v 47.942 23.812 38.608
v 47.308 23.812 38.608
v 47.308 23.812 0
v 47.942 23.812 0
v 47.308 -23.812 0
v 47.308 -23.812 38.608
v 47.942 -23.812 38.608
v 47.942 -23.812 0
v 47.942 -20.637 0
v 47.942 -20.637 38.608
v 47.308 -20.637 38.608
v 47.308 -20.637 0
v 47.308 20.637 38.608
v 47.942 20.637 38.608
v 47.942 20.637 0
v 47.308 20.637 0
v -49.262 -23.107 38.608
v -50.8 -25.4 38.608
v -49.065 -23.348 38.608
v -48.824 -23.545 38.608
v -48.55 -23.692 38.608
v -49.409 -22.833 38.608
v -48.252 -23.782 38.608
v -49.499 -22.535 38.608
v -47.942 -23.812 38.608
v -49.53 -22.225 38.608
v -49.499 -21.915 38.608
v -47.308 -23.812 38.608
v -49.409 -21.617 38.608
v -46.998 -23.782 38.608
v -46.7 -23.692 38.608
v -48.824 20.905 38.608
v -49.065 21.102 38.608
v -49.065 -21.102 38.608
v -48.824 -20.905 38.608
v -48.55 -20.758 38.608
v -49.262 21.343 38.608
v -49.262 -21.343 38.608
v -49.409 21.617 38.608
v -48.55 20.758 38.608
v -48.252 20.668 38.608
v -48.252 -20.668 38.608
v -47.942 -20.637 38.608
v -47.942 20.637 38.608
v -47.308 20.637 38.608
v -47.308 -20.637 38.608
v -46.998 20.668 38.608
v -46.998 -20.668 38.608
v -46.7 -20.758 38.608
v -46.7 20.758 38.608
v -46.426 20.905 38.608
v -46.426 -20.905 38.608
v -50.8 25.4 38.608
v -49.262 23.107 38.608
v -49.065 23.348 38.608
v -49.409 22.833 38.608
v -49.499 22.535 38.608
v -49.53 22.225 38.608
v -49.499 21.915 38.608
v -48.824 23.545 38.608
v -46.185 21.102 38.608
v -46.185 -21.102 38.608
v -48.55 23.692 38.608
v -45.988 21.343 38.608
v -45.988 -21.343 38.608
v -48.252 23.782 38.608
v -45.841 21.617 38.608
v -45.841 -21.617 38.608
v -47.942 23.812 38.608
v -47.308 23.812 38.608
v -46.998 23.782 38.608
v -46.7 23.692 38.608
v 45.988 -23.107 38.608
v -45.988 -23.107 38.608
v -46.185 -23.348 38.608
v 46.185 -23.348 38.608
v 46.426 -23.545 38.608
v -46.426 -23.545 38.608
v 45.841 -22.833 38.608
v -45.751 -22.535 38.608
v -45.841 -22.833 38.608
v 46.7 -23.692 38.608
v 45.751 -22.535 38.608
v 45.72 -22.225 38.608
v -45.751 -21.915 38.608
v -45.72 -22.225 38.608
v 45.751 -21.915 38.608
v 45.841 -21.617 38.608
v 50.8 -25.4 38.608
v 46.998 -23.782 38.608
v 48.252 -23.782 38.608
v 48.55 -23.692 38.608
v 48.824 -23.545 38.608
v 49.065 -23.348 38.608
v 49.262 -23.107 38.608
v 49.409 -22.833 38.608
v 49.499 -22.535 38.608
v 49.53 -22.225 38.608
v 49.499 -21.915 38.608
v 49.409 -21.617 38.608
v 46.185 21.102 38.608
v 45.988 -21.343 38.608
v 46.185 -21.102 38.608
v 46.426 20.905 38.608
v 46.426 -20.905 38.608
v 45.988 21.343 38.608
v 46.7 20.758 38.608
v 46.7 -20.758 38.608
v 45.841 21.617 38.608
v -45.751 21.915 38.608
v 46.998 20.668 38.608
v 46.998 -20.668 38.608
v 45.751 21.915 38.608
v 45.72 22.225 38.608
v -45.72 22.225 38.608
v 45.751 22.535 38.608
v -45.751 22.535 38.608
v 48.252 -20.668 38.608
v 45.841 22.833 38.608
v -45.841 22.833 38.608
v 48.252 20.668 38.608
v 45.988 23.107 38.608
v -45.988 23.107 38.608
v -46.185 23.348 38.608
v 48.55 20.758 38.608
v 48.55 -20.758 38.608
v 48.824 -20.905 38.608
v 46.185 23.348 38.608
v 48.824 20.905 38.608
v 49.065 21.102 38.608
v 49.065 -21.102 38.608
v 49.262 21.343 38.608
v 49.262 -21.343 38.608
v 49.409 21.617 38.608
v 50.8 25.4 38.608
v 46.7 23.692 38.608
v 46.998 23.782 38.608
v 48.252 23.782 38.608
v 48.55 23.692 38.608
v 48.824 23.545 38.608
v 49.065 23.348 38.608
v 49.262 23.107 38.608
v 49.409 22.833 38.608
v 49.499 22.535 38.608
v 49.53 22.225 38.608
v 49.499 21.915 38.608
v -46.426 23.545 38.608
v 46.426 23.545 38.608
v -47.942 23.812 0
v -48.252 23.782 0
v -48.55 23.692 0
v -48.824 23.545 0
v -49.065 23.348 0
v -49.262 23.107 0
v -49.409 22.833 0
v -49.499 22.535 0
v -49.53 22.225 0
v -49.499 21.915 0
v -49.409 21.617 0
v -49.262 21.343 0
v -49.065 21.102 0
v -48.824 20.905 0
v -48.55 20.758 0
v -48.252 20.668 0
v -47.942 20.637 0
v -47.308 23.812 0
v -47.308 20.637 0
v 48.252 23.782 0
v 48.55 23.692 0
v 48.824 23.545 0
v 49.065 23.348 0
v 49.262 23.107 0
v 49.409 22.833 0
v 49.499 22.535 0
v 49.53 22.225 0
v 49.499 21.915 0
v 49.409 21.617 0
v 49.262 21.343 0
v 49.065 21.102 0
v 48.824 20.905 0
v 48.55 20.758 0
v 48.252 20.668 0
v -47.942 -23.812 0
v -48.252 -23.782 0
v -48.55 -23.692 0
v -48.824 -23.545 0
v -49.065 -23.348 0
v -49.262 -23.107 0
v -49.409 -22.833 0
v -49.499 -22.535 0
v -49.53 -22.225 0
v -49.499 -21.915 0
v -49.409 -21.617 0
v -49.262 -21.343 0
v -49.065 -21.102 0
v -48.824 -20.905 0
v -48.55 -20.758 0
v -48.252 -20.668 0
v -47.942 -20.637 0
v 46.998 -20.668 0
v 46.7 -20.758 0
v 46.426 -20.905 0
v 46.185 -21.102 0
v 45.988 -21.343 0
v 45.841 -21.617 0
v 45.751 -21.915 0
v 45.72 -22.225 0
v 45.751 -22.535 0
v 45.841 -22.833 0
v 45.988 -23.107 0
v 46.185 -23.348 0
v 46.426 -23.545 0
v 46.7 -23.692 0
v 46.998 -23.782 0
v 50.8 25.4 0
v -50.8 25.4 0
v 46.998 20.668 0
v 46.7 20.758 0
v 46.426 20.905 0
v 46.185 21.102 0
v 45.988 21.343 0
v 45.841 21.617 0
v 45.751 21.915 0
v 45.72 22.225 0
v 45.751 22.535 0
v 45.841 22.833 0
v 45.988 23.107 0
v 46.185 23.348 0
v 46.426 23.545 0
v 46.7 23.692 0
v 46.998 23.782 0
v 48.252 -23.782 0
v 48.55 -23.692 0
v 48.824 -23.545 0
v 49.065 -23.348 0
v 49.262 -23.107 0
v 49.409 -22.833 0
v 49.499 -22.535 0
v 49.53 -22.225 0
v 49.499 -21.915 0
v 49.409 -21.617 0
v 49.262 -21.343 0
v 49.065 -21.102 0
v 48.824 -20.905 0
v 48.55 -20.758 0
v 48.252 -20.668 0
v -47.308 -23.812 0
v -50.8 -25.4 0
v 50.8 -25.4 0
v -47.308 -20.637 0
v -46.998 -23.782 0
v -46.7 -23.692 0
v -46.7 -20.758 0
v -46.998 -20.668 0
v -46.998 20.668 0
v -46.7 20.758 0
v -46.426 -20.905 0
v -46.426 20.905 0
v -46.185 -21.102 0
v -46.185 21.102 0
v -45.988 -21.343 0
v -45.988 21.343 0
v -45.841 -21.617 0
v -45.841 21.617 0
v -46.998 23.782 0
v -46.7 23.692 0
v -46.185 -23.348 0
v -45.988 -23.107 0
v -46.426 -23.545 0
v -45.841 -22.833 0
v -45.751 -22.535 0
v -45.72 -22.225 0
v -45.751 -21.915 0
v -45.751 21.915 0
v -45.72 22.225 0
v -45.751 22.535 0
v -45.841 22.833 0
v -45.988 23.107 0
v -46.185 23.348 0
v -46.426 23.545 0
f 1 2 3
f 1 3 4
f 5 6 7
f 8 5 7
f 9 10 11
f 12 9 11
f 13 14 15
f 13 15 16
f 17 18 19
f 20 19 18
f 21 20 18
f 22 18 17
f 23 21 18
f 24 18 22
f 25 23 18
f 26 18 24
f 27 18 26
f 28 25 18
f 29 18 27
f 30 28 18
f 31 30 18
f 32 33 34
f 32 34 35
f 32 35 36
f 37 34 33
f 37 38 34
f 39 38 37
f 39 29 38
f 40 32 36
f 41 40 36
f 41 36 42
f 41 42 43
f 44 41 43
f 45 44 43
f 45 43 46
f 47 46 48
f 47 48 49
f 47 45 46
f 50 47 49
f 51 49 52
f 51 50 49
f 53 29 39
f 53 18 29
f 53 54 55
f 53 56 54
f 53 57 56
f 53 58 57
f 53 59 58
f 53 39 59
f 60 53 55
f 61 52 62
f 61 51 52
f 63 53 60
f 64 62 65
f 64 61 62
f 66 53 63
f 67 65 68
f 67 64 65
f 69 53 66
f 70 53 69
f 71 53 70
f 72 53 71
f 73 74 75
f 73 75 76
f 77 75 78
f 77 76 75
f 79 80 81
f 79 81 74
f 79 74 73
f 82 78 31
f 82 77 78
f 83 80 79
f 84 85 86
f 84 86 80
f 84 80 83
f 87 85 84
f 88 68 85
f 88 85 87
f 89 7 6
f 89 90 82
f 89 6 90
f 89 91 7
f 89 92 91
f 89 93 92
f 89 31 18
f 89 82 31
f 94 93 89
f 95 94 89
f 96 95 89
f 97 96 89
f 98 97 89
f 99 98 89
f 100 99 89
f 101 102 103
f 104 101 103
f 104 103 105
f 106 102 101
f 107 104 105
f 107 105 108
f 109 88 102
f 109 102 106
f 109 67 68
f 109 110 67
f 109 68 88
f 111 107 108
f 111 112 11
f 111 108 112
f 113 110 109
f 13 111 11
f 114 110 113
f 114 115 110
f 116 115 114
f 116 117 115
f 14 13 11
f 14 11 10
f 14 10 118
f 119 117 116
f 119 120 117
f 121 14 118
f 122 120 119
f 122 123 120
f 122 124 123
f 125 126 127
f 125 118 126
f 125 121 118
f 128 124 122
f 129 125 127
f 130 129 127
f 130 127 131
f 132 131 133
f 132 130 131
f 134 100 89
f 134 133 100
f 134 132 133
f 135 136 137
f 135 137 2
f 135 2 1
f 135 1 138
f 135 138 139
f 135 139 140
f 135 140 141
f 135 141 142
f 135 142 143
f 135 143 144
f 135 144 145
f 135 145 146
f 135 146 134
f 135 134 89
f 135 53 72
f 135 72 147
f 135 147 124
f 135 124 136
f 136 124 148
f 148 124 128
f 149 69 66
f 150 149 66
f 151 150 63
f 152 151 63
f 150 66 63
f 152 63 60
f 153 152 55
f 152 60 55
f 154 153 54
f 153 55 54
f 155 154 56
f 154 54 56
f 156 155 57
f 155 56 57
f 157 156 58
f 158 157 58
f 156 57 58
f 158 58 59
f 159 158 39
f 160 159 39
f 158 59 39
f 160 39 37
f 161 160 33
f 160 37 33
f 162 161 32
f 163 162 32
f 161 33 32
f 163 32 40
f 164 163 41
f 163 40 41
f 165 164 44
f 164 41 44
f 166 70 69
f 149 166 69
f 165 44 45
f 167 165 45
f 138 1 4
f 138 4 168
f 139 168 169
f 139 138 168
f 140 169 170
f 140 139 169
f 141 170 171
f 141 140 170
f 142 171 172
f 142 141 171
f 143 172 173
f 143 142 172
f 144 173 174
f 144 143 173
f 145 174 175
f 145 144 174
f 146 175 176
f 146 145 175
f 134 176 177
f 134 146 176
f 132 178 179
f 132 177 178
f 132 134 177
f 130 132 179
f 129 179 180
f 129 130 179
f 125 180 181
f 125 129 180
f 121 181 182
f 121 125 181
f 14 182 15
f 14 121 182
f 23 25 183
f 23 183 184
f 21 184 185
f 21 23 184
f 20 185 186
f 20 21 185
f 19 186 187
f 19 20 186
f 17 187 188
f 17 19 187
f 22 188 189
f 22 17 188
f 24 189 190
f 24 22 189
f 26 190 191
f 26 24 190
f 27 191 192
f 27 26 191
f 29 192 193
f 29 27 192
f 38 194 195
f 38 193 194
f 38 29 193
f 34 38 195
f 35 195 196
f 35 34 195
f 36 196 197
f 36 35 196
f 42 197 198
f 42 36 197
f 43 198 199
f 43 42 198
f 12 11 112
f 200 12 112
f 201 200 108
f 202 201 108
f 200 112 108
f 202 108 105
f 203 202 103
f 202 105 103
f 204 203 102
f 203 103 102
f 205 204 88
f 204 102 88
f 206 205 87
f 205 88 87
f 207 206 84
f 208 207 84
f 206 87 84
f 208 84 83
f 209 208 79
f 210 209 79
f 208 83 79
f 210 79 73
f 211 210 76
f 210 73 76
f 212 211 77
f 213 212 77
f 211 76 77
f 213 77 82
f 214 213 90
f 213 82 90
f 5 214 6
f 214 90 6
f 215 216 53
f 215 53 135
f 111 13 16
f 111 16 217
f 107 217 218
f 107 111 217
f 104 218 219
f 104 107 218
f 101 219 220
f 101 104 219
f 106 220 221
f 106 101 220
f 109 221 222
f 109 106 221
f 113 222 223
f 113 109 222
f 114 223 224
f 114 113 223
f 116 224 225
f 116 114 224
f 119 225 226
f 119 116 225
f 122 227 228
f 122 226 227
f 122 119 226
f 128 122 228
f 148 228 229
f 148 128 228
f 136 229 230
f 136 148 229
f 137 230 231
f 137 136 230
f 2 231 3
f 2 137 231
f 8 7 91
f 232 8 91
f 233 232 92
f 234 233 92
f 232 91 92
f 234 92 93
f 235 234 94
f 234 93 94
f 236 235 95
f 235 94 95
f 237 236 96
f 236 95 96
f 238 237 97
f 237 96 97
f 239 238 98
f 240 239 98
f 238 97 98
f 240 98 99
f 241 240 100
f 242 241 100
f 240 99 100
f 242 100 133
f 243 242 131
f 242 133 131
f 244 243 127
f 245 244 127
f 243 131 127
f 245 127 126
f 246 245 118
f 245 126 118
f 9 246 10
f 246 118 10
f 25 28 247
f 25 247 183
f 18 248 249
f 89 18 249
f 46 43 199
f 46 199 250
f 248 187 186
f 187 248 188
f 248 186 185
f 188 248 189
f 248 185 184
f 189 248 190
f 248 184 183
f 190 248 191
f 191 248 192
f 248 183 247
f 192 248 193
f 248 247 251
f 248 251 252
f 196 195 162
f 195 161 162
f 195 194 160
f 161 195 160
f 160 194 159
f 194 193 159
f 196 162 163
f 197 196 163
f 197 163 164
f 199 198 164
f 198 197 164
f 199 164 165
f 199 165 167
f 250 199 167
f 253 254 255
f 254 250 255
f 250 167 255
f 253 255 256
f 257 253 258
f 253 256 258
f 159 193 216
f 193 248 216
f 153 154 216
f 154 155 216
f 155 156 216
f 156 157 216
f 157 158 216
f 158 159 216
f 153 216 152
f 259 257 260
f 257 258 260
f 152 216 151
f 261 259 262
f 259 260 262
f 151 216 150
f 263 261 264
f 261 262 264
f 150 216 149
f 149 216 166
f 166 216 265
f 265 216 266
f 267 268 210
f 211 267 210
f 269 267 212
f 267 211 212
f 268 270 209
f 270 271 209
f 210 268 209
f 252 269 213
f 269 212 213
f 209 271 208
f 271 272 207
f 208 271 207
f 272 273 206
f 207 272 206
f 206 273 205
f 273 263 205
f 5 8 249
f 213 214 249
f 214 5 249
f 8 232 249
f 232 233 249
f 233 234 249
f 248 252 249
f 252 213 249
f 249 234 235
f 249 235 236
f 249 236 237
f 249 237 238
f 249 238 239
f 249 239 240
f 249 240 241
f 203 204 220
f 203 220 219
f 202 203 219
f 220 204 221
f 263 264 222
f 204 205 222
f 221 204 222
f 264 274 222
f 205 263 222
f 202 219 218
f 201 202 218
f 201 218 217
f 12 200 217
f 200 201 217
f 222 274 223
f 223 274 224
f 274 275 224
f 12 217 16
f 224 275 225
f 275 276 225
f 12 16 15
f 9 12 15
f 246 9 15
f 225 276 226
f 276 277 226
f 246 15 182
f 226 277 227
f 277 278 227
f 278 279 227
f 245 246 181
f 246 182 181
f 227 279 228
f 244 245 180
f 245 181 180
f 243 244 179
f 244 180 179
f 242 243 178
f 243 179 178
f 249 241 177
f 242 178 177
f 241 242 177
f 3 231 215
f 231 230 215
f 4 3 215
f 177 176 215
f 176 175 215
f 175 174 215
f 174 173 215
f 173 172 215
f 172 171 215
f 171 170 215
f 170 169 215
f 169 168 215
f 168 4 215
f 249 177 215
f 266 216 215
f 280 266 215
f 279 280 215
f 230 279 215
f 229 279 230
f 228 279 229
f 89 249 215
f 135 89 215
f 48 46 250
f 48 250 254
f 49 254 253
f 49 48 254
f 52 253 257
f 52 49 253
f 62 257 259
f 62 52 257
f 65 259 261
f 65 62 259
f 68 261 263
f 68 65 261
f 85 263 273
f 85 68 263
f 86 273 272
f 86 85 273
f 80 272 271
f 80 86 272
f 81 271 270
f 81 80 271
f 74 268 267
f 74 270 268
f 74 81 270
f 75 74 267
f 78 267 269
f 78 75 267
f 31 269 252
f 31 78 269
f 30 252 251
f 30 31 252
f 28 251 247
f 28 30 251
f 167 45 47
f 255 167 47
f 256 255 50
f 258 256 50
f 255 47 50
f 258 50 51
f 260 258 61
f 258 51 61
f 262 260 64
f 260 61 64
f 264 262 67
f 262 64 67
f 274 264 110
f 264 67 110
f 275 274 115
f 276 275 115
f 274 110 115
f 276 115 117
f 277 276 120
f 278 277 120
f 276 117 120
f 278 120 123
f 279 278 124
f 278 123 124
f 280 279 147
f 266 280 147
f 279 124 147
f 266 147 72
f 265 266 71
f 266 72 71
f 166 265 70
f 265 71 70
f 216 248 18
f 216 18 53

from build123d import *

# Parameters (mm, degrees)
SKETCH1_W            = 101.6
SKETCH1_H            = 50.8
BOSS_EXTRUDE1_DEPTH  = 38.608
CUT_EXTRUDE1_DEPTH   = 69.67588852
MIRROR2_COPY_1_DEPTH = 69.67588852


with BuildPart() as part:
    # Sketch1 → Boss-Extrude1 (new body)
    with BuildSketch(Plane.XY):
        Rectangle(SKETCH1_W, SKETCH1_H)
    extrude(amount=BOSS_EXTRUDE1_DEPTH)

    # Sketch4 → Cut-Extrude1 (cut, through all)
    with BuildSketch(Plane.XY.offset(38.608)):
        with BuildLine():
            Line((47.3075, 23.8125), (47.9425, 23.8125))
            ThreePointArc((47.9425, 23.8125), (49.53, 22.225), (47.9425, 20.6375))
            Line((47.9425, 20.6375), (47.3075, 20.6375))
            ThreePointArc((47.3075, 20.6375), (45.72, 22.225), (47.3075, 23.8125))
        make_face()
    cut_extrude1 = extrude(amount=-CUT_EXTRUDE1_DEPTH, mode=Mode.SUBTRACT)

    # Mirror1: Cut-Extrude1 across plane
    add(cut_extrude1.mirror(Plane.ZX), mode=Mode.SUBTRACT)

    # Mirror2: Cut-Extrude1 across plane
    add(cut_extrude1.mirror(Plane(origin=(0, 0, 0), x_dir=(0, 0, 1), z_dir=(1, 0, 0))), mode=Mode.SUBTRACT)

    # Mirror2 copy 1 sketch → Mirror2 copy 1 (cut, through all)
    with BuildSketch(Plane(origin=(0, 0, 38.608), x_dir=(-1, 0, 0), z_dir=(0, 0, 1))):
        with BuildLine():
            Line((47.3075, 23.8125), (47.9425, 23.8125))
            ThreePointArc((47.9425, 23.8125), (49.53, 22.225), (47.9425, 20.6375))
            Line((47.9425, 20.6375), (47.3075, 20.6375))
            ThreePointArc((47.3075, 20.6375), (45.72, 22.225), (47.3075, 23.8125))
        make_face()
    extrude(amount=-MIRROR2_COPY_1_DEPTH, mode=Mode.SUBTRACT)


solid = part.part
